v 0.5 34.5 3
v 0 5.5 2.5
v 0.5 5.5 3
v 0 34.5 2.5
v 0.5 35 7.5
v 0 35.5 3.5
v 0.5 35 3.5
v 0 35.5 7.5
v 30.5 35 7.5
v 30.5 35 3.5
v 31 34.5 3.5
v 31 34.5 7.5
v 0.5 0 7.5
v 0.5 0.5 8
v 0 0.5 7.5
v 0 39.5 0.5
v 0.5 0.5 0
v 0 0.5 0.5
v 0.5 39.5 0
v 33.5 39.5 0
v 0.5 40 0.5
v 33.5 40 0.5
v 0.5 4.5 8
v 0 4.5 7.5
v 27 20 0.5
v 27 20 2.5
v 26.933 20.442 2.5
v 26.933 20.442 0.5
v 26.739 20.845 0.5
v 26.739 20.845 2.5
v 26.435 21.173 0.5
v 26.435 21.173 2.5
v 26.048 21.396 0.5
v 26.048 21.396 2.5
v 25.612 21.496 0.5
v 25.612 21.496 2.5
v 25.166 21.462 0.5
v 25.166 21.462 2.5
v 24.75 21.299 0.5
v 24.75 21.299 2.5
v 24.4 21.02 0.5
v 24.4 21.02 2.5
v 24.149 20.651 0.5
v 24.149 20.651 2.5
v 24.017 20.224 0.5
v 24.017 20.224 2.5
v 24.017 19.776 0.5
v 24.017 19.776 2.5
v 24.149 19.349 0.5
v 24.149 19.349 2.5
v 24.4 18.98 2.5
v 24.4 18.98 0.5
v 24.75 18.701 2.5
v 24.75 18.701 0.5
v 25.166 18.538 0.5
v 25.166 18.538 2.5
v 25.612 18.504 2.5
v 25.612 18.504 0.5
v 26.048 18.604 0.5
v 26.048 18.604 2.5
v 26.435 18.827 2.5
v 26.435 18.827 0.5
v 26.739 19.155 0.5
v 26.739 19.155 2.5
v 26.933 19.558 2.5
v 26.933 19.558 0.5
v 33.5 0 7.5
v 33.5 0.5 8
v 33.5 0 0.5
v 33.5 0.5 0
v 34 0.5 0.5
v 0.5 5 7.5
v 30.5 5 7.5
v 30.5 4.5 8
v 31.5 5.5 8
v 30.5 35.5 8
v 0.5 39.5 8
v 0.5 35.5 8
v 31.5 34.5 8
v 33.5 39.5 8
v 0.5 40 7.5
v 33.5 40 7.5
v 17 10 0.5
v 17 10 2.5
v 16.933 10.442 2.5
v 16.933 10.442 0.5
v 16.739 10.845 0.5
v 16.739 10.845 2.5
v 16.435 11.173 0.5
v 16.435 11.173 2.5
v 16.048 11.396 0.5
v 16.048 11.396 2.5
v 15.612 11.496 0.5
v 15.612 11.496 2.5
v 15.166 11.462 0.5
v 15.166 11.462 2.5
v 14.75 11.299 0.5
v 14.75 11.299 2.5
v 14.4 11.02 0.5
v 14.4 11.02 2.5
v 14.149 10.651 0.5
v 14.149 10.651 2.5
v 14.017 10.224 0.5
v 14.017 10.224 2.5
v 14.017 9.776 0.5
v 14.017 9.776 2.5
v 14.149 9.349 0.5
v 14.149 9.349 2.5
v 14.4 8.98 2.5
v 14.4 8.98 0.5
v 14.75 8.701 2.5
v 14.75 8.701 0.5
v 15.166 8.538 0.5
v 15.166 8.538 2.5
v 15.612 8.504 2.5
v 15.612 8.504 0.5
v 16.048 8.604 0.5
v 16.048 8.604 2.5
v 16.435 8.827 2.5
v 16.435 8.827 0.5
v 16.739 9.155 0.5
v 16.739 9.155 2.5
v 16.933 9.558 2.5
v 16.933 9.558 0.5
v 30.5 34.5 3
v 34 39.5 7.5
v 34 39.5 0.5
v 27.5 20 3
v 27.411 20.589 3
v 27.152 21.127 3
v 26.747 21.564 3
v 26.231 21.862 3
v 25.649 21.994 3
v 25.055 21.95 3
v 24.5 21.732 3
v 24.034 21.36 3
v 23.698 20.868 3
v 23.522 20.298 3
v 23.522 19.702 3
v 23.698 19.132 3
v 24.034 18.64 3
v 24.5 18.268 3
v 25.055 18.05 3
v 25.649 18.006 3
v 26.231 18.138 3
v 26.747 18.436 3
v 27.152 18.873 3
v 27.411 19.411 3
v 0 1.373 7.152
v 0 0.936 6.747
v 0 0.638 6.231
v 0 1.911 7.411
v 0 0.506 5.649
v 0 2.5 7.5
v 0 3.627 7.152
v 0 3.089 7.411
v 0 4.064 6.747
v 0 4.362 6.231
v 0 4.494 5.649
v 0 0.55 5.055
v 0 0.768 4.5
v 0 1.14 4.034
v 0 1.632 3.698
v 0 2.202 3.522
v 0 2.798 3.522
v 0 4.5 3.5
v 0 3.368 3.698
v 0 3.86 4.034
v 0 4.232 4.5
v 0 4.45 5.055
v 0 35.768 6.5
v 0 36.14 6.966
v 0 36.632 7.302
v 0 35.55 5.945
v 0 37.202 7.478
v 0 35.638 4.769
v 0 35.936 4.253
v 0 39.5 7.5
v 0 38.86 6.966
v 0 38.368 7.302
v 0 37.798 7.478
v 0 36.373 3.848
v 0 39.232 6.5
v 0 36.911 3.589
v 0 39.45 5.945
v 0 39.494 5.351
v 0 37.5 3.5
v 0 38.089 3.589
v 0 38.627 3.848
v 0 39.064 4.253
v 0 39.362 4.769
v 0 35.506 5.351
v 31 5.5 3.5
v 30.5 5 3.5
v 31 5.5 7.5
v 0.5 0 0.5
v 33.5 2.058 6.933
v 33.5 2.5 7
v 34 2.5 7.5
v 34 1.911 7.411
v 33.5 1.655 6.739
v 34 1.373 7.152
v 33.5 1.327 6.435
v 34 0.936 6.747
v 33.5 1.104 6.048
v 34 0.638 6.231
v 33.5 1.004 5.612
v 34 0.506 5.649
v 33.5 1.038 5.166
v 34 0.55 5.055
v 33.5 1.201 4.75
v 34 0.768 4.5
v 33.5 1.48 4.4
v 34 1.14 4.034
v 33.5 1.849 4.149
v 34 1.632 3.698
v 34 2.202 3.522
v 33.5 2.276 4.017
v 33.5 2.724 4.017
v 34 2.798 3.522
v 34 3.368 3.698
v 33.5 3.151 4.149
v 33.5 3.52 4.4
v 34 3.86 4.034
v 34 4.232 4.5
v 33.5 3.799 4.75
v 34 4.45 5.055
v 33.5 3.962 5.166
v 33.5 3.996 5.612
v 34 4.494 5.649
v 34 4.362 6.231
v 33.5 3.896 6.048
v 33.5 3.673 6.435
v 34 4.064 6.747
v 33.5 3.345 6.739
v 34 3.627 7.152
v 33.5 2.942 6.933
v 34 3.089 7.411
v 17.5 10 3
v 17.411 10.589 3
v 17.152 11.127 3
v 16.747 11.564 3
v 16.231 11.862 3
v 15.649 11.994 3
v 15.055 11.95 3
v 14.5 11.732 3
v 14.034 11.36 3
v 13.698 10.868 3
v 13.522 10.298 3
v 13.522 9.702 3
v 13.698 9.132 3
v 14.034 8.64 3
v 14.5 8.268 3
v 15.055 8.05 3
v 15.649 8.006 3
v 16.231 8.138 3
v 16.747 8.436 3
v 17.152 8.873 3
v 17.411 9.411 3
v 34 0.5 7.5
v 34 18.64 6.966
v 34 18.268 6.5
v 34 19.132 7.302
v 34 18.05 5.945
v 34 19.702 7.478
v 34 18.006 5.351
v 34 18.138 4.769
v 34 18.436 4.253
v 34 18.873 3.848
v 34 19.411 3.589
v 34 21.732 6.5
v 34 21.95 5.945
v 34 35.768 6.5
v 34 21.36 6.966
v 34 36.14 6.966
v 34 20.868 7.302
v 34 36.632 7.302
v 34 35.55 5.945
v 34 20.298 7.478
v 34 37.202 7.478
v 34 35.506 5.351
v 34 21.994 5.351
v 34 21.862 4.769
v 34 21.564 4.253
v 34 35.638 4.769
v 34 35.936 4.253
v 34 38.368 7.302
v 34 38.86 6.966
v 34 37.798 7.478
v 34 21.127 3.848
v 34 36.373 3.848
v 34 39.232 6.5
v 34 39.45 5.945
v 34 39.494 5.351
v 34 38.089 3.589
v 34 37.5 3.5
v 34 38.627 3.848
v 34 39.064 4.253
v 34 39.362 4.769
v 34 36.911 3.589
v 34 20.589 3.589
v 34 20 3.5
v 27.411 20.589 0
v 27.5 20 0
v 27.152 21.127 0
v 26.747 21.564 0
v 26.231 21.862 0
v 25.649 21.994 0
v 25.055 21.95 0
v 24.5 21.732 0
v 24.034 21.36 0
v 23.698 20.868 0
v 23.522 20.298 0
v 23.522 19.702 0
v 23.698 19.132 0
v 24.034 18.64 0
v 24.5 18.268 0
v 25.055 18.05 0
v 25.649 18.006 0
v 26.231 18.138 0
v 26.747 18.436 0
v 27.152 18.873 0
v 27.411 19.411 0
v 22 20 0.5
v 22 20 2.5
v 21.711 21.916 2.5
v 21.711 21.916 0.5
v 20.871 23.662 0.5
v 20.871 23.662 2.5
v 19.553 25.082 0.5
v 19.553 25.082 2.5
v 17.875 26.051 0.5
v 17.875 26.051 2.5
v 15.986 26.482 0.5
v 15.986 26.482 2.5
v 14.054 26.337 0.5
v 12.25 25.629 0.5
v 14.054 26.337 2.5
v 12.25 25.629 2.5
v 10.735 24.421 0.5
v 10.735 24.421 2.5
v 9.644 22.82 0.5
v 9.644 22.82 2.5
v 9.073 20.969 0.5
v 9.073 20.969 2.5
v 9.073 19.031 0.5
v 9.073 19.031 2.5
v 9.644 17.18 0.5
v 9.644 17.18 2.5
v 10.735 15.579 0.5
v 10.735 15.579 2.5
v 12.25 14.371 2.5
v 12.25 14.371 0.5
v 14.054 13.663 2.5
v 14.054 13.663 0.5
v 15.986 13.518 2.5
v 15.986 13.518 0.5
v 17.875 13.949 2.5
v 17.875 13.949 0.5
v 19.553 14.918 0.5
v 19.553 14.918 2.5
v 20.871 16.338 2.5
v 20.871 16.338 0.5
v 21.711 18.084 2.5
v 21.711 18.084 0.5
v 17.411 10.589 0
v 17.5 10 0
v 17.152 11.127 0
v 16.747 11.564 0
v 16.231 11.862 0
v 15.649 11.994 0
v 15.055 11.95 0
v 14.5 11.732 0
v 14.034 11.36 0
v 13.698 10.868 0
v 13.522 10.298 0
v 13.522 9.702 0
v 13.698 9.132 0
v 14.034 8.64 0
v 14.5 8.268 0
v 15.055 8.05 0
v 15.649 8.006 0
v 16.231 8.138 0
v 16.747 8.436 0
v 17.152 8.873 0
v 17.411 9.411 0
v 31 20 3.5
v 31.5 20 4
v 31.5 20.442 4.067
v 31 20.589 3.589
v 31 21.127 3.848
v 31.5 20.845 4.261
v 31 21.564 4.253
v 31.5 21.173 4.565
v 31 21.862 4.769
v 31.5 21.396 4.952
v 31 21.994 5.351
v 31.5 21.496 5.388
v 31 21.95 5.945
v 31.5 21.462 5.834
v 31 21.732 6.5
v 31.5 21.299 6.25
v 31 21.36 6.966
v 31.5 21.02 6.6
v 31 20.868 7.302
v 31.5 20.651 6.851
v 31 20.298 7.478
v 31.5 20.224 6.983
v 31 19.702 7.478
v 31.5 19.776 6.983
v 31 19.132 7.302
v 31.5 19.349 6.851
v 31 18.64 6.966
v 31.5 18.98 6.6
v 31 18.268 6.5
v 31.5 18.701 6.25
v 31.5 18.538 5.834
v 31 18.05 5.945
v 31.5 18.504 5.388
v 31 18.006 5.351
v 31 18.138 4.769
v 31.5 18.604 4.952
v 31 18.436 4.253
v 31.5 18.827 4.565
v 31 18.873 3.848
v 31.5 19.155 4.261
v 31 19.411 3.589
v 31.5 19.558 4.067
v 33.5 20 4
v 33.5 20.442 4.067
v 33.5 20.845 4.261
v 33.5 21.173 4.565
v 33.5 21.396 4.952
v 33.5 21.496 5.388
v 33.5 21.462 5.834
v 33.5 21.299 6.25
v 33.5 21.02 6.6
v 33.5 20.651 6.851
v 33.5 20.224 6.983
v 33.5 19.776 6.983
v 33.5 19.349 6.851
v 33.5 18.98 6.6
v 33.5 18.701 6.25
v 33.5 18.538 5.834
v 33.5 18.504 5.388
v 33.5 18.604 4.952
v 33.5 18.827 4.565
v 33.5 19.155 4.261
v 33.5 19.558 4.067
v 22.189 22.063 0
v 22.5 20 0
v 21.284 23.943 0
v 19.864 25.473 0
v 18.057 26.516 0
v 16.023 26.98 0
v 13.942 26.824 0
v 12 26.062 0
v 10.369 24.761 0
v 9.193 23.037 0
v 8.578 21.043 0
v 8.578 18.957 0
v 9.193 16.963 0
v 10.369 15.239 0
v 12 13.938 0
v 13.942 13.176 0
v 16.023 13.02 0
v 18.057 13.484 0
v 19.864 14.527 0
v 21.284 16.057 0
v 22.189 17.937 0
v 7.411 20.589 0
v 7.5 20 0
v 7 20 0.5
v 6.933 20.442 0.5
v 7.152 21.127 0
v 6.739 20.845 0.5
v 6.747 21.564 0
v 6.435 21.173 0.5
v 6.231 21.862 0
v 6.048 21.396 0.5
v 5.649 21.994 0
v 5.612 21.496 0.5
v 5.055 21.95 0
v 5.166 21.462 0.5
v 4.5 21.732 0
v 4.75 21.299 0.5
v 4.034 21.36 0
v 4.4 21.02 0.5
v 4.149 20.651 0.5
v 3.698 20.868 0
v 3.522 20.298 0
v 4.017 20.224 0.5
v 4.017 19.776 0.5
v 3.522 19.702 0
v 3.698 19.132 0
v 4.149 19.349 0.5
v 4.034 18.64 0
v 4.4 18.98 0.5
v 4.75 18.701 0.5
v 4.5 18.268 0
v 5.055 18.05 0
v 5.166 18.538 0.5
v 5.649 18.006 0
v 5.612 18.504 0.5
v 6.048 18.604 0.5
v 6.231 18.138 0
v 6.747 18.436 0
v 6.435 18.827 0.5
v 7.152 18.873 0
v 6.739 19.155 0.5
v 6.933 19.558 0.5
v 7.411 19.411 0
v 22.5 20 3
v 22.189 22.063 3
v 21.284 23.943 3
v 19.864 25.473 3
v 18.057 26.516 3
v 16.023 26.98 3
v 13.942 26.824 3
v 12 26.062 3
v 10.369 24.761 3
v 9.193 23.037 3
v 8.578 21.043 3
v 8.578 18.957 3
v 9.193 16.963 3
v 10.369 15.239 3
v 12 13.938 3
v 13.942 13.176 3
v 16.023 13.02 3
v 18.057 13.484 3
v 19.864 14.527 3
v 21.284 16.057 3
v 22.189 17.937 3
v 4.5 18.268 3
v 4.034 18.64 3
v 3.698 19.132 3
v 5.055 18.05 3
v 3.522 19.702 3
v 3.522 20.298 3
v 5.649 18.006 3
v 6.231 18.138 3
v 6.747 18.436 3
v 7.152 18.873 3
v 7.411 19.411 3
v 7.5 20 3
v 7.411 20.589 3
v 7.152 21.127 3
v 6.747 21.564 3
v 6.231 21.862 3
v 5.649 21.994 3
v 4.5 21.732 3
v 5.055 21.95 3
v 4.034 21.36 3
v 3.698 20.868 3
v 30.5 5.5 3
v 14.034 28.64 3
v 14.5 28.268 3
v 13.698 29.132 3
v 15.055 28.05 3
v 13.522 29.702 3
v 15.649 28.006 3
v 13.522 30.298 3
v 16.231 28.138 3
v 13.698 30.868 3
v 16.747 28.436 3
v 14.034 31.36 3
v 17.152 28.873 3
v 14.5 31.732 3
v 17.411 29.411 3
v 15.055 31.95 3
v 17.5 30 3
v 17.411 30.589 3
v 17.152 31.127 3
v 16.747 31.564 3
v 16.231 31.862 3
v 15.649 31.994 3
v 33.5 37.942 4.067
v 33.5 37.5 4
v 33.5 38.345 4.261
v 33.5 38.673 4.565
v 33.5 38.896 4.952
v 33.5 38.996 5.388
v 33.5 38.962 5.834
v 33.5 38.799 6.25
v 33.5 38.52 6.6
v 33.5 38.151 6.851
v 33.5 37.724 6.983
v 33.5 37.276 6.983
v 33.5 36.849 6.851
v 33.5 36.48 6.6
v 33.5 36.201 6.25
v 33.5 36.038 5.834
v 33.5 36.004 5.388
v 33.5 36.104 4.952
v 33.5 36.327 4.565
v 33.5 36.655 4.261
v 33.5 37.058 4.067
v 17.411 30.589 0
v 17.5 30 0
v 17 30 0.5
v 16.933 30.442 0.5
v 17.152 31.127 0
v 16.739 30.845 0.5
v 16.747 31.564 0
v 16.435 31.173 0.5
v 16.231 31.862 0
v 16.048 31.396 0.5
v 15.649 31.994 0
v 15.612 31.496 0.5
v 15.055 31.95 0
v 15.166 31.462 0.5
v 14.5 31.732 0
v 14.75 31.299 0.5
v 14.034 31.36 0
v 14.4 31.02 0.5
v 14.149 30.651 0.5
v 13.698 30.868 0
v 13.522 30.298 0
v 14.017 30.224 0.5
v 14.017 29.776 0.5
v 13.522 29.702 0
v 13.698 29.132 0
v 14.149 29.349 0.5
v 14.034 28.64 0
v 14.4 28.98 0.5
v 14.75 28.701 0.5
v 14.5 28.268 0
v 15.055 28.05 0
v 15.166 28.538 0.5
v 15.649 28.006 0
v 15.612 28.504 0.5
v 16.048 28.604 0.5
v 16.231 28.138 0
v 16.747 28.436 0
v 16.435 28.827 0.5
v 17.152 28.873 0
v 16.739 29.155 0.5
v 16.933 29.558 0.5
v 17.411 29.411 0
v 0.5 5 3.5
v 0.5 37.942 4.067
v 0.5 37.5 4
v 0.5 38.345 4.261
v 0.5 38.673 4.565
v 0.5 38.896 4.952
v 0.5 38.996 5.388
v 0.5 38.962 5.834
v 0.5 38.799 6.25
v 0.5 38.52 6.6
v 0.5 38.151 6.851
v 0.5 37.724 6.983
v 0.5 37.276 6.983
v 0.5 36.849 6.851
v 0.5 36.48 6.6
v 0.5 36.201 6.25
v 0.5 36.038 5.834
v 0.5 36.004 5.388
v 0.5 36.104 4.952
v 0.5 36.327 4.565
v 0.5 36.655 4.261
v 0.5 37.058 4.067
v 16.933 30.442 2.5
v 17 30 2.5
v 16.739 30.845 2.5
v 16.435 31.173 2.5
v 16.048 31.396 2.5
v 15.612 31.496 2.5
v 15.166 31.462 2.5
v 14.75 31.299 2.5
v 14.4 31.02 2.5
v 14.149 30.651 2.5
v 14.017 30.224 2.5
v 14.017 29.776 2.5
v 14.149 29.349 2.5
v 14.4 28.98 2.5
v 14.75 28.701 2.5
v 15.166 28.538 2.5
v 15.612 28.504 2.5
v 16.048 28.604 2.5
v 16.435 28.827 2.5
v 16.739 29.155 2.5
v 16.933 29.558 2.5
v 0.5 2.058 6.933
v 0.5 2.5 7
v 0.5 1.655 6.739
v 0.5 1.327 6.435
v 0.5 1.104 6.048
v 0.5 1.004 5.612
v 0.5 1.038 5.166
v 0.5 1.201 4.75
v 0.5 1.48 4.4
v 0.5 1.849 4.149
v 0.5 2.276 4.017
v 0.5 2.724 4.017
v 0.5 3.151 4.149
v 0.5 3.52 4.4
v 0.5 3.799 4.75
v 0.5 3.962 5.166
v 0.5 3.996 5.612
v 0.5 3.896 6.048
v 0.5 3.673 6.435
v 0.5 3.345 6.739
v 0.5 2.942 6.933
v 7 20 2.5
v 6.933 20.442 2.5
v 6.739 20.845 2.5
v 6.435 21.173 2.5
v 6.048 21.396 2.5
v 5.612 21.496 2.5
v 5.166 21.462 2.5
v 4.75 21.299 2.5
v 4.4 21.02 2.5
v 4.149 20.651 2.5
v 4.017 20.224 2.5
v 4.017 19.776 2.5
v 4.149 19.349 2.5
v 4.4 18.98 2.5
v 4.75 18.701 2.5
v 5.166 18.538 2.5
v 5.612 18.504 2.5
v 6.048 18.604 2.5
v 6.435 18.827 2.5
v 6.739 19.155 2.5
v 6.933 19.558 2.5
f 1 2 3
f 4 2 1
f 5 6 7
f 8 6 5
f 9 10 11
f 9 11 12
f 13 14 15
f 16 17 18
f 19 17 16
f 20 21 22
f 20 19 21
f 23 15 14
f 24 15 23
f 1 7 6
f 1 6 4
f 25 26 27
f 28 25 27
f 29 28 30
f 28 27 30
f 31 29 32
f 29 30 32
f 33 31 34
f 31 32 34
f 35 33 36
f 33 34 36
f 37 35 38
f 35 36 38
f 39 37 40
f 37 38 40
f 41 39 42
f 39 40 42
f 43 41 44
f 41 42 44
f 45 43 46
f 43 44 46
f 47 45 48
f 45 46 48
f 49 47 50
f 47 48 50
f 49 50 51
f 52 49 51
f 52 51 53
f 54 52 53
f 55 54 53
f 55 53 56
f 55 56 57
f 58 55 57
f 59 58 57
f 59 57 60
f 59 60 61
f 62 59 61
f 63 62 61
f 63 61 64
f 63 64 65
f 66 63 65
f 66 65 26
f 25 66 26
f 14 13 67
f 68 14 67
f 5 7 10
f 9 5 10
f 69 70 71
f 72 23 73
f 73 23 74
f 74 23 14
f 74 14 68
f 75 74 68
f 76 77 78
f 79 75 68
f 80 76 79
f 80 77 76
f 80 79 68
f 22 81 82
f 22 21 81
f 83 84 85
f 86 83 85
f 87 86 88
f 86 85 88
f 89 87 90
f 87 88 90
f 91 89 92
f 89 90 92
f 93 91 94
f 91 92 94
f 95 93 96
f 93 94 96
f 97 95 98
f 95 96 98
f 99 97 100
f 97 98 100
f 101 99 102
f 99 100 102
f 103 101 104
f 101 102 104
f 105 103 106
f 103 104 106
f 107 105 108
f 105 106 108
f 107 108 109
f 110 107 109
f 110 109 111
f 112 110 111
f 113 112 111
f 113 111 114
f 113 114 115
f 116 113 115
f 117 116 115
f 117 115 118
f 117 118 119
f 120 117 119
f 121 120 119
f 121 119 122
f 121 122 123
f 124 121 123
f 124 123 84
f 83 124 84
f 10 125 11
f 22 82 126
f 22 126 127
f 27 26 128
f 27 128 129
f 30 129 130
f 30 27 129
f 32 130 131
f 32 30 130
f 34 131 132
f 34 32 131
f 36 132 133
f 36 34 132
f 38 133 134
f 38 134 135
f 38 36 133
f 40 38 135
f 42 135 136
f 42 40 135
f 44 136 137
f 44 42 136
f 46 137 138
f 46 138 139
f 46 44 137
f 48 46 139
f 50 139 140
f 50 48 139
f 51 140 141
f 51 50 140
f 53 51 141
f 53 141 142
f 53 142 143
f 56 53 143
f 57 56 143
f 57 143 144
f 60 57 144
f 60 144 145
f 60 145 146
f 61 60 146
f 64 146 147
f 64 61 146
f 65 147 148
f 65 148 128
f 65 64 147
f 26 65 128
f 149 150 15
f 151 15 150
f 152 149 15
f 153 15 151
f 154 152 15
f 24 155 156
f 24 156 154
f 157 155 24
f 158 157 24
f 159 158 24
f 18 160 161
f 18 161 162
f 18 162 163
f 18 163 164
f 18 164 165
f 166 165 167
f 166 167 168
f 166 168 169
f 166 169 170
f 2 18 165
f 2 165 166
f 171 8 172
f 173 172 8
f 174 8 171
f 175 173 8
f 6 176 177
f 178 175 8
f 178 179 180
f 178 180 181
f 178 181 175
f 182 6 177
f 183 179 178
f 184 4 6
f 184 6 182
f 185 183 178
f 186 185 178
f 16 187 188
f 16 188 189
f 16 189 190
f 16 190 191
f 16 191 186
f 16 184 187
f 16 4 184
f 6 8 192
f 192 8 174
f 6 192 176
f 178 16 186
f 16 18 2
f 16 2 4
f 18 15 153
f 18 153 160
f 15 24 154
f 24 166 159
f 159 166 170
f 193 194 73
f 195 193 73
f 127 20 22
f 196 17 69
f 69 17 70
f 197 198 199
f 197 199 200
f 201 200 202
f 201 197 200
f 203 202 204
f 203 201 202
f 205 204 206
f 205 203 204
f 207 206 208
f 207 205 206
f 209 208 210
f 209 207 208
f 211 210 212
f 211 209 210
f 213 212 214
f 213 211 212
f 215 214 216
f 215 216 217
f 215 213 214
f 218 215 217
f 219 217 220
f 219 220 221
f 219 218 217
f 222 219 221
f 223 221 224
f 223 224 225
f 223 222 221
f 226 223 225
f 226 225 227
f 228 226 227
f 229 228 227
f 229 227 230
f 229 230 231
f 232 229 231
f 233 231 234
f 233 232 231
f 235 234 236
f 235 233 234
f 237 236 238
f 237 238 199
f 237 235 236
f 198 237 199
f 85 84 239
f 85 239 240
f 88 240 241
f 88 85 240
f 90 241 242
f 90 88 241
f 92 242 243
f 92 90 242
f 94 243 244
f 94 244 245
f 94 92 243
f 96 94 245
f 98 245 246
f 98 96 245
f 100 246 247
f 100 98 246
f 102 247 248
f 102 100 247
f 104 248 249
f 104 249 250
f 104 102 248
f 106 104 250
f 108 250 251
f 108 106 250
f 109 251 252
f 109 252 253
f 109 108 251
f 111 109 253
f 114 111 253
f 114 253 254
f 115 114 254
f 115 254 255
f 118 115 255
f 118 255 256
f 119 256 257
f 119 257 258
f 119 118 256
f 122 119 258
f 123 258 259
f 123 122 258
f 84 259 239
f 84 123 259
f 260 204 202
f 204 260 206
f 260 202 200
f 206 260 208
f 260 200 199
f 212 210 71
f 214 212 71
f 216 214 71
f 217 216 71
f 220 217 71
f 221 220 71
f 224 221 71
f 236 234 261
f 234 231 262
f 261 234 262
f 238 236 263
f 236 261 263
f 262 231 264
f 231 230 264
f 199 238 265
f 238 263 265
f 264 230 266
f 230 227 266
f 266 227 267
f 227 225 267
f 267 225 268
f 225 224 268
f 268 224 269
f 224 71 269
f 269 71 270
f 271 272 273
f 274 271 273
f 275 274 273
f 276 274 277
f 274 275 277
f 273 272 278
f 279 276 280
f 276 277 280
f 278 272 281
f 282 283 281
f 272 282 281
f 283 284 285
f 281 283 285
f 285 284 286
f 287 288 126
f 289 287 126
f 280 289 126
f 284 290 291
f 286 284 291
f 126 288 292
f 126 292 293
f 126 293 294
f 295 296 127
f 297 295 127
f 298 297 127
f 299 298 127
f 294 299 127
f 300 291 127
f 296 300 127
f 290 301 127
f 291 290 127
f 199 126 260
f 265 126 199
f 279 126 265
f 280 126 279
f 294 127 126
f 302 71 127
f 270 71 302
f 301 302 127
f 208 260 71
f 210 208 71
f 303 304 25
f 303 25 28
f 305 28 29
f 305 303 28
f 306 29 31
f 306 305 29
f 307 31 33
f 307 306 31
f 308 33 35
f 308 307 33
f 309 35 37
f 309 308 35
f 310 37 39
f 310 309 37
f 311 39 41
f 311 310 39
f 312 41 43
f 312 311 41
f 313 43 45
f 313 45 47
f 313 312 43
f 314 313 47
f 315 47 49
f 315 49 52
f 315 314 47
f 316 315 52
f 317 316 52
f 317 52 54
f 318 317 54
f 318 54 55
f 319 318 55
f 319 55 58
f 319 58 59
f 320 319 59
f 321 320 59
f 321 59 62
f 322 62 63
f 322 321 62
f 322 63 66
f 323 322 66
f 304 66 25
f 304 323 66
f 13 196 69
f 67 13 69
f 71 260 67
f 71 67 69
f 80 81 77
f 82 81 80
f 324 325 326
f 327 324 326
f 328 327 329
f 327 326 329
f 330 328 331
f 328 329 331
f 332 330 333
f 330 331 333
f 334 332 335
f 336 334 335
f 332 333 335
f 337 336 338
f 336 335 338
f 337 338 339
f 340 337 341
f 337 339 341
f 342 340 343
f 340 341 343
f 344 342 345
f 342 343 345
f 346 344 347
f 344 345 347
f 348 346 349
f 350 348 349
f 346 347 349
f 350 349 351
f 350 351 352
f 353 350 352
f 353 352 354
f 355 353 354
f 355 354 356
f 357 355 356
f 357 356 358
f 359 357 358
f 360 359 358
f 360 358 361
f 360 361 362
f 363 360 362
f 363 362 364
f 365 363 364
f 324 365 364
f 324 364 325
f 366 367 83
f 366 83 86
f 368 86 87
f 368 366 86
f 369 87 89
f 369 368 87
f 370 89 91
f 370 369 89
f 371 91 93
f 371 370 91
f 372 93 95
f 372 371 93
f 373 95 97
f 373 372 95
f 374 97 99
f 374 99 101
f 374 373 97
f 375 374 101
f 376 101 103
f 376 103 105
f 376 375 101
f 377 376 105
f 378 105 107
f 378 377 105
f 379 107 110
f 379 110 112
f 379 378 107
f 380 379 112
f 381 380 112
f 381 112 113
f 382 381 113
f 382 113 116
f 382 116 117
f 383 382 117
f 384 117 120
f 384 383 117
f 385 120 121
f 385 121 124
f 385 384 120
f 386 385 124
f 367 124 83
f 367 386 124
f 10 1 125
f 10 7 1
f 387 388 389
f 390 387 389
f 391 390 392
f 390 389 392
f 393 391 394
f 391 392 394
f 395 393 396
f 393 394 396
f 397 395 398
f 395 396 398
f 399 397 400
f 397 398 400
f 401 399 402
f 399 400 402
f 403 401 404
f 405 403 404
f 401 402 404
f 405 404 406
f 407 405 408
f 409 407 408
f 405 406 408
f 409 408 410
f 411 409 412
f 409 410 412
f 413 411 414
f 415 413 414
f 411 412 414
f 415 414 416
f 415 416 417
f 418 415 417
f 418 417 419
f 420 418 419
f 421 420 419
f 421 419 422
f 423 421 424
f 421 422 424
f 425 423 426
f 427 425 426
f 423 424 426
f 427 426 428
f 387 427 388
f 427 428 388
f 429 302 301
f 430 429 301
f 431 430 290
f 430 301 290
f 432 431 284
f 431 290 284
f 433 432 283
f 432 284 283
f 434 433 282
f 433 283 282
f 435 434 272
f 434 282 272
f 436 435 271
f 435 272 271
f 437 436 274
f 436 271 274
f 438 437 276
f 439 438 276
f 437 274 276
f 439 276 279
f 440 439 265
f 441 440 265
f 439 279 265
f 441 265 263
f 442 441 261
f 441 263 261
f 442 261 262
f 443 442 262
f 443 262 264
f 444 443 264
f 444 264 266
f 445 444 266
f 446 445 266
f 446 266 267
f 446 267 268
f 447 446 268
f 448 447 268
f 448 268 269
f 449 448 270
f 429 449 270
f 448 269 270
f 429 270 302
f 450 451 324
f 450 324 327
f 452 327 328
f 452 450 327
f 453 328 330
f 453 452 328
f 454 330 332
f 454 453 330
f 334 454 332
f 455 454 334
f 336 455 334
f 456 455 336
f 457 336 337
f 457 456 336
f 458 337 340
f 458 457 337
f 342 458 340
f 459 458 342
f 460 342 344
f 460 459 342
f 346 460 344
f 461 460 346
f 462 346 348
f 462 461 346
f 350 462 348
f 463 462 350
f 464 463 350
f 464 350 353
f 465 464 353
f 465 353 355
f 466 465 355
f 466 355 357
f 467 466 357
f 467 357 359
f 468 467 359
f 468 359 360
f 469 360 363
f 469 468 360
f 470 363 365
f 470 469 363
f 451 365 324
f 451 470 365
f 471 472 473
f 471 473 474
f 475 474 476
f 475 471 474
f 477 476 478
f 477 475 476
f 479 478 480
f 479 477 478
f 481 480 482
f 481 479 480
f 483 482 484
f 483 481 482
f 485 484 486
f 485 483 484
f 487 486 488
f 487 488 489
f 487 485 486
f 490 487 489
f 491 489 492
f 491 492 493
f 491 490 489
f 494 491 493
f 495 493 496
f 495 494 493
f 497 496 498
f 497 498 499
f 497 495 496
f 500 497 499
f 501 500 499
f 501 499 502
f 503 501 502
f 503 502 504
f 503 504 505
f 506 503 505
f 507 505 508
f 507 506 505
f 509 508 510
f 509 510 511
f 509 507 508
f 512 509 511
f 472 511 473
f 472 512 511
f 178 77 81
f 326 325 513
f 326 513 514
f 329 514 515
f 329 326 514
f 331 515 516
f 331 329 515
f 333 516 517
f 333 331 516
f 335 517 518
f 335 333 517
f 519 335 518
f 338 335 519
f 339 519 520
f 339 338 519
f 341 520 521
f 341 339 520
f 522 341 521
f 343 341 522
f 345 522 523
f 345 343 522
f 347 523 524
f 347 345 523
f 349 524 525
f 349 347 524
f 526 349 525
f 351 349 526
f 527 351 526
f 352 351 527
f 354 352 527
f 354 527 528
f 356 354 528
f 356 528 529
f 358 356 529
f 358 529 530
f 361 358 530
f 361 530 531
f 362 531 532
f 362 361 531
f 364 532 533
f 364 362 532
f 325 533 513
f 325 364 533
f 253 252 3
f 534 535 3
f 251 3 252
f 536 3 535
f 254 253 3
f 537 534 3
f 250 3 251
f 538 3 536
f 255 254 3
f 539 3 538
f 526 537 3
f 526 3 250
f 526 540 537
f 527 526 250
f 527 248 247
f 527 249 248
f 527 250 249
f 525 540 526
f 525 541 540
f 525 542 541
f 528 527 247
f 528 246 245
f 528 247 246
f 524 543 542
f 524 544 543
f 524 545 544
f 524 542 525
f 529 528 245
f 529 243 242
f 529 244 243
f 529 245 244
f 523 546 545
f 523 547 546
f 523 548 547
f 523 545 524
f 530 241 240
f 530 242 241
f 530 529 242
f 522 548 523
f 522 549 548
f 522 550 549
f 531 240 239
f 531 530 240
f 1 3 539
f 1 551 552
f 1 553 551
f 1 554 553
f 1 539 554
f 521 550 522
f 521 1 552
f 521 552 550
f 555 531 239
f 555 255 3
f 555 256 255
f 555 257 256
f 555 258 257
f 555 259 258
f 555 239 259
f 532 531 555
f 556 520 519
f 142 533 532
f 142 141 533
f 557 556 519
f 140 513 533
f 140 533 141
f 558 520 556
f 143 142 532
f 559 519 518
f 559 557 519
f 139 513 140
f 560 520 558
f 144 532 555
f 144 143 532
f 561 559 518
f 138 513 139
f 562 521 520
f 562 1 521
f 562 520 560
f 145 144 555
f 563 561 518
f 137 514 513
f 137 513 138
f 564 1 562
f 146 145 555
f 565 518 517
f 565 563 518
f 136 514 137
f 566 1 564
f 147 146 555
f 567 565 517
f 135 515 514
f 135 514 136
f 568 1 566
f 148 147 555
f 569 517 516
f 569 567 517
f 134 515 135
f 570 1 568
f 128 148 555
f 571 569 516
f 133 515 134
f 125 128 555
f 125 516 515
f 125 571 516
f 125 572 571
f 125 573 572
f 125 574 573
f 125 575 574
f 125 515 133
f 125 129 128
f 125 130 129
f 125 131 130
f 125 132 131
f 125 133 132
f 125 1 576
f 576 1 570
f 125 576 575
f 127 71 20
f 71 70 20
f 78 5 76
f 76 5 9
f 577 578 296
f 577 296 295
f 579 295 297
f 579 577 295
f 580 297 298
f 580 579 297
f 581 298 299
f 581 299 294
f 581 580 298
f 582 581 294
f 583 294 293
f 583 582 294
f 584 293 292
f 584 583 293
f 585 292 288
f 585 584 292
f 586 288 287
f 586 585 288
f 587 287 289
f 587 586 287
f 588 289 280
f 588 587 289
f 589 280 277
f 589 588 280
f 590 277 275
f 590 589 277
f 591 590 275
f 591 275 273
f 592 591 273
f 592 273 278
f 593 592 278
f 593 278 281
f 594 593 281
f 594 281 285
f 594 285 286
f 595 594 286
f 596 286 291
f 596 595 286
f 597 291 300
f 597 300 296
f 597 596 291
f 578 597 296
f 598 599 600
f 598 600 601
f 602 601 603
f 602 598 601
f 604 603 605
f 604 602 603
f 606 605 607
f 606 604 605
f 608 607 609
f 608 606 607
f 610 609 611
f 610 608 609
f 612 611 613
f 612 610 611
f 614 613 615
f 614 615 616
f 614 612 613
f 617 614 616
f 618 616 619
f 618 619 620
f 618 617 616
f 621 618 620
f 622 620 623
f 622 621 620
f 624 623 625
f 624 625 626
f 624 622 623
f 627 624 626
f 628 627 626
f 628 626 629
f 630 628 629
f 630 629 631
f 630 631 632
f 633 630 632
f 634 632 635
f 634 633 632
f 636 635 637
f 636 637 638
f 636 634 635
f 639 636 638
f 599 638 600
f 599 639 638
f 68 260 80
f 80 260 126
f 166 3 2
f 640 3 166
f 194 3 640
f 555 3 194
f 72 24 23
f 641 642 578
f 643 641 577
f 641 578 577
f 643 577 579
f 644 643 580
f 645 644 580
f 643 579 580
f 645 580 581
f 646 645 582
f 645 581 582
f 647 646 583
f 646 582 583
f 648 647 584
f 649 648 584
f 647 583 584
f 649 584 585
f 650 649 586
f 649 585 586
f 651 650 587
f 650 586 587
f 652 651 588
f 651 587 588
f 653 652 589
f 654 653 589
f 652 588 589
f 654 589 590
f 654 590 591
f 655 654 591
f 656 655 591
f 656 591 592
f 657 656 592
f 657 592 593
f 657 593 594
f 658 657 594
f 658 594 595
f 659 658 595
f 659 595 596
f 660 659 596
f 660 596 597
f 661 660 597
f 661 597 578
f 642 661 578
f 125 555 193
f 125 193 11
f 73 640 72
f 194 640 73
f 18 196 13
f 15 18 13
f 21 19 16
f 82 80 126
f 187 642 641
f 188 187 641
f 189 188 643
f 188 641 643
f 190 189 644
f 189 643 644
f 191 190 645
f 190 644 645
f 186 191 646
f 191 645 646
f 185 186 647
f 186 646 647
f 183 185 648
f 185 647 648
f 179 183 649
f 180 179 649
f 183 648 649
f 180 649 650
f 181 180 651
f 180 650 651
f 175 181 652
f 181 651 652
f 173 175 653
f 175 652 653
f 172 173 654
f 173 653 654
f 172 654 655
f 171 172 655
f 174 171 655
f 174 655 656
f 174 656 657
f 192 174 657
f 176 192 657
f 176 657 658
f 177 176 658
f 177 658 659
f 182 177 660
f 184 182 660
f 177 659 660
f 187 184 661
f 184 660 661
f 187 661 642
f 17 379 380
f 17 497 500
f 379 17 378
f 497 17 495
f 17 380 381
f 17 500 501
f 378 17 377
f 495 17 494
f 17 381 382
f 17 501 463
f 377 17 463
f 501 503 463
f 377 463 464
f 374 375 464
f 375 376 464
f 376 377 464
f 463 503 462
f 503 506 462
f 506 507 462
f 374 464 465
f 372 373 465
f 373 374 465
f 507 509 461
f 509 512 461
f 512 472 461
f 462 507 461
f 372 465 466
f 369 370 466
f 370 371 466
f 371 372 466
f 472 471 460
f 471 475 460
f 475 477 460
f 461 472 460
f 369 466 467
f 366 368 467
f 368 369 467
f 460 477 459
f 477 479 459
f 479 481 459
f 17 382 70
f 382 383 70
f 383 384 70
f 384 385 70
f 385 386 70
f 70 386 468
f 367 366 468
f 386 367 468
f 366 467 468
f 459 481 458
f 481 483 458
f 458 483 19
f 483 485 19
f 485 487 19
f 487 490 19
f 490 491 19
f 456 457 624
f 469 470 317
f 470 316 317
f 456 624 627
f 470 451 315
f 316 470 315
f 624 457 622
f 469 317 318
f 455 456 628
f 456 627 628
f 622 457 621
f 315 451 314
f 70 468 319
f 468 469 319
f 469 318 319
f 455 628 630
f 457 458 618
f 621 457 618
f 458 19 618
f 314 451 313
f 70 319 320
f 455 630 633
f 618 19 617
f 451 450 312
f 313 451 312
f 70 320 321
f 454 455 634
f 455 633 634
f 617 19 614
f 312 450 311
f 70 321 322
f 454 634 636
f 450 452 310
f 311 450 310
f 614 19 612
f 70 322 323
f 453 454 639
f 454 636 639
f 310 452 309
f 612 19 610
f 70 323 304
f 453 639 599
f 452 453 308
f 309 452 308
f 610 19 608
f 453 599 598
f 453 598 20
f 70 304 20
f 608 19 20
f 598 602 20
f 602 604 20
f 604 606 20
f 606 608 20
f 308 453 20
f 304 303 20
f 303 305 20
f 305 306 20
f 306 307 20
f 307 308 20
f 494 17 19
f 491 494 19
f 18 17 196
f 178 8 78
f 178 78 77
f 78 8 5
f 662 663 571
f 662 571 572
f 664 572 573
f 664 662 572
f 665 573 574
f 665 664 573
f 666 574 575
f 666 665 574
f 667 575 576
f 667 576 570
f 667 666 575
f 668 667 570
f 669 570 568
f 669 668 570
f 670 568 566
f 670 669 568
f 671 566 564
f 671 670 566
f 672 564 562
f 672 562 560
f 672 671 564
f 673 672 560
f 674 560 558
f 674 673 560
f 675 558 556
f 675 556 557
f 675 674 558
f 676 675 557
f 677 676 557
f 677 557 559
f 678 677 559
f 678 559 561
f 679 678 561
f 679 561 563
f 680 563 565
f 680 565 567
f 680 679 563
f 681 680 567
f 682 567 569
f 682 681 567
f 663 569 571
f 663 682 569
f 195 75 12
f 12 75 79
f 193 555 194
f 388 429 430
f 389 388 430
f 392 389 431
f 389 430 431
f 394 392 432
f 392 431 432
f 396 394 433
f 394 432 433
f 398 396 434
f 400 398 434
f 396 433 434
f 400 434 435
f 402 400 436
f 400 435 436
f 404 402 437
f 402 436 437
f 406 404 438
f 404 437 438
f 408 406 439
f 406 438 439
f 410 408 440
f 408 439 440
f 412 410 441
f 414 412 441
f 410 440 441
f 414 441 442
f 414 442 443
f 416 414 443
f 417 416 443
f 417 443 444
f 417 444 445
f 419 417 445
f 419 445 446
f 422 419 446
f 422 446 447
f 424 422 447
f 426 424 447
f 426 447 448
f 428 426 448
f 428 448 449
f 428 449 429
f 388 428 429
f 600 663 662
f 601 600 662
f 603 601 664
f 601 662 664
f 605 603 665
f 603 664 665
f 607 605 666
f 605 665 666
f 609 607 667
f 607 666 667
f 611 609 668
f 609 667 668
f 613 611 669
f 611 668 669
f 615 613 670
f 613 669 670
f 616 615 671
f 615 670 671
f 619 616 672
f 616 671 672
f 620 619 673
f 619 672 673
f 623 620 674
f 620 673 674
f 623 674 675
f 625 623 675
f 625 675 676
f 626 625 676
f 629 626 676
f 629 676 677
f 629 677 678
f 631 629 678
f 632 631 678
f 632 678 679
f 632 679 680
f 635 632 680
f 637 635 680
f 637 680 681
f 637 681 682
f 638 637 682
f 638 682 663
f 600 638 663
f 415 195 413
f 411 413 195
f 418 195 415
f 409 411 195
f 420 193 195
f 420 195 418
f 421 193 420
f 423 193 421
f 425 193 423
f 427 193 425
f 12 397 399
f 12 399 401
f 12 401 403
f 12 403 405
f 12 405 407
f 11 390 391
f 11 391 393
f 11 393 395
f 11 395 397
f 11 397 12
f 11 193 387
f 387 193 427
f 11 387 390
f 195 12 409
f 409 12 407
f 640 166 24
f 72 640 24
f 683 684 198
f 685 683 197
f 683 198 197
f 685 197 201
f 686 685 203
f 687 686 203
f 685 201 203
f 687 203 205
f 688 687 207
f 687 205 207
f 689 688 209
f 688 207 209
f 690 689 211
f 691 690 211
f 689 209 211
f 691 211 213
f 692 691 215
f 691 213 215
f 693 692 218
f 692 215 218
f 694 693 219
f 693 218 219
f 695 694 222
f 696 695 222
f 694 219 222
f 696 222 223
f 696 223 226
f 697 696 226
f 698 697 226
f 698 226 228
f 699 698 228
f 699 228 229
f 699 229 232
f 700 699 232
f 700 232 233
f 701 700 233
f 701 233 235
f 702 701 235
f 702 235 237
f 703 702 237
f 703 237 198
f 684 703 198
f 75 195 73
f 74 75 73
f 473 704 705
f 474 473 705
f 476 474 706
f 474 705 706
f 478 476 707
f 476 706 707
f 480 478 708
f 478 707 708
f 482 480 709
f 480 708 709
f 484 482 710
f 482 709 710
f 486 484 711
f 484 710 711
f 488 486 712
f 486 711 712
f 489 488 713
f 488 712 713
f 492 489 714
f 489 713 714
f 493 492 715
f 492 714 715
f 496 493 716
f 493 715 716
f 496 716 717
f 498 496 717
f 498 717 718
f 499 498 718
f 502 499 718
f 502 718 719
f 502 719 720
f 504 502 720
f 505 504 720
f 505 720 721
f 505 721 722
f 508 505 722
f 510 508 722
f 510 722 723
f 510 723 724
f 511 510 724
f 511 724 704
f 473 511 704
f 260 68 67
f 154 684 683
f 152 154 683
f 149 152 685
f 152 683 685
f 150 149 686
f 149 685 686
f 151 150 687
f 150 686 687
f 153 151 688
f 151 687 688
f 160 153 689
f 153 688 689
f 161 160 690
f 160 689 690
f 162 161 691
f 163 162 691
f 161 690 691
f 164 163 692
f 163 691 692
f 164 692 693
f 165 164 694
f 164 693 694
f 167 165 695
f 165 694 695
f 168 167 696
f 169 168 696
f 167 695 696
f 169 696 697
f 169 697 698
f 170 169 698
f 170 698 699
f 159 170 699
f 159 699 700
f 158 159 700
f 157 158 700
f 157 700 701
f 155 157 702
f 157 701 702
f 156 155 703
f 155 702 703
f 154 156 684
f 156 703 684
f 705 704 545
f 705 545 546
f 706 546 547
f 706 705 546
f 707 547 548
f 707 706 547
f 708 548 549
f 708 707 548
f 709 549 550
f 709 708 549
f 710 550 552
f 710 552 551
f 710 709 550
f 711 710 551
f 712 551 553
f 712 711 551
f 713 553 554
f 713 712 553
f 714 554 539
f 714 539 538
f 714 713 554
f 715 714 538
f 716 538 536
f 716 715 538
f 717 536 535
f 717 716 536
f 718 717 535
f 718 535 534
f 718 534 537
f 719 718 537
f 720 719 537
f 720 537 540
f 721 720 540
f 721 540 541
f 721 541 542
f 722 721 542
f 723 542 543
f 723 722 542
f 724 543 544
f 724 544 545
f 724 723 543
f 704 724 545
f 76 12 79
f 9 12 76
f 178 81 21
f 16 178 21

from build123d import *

# Parameters (mm, degrees)
ESQUISSE1_W             = 34
ESQUISSE1_H             = 40
BOSS_EXTRU_1_DEPTH      = 3
ESQUISSE2_R             = 6.5
ENL_V_MAT_EXTRU_1_DEPTH = 4
ESQUISSE5_R             = 1.5
ENL_V_MAT_EXTRU_3_DEPTH = 5
ESQUISSE9_W             = 34
ESQUISSE9_H             = 5
BOSS_EXTRU_5_DEPTH      = 5
ESQUISSE10_R            = 1.5
ENL_V_MAT_EXTRU_6_DEPTH = 54.103672189
ESQUISSE11_W            = 3
ESQUISSE11_H            = 30
BOSS_EXTRU_6_DEPTH      = 5
ESQUISSE12_R            = 1.5
ENL_V_MAT_EXTRU_7_DEPTH = 5
CHANFREIN1_SIZE         = 0.5


with BuildPart() as part:
    # Esquisse1 → Boss.-Extru.1 (new body)
    with BuildSketch(Plane.XY):
        with Locations((17, 20)):
            Rectangle(ESQUISSE1_W, ESQUISSE1_H)
    extrude(amount=BOSS_EXTRU_1_DEPTH)

    # Esquisse2 → Enlèv. mat.-Extru.1 (cut)
    with BuildSketch(Plane.XY.offset(3)):
        with Locations((15.5, 20)):
            Circle(ESQUISSE2_R)
    extrude(amount=-ENL_V_MAT_EXTRU_1_DEPTH, mode=Mode.SUBTRACT)

    # Esquisse5 → Enlèv. mat.-Extru.3 (cut)
    with BuildSketch(Plane.XY.offset(3)):
        with Locations((15.5, 30)):
            Circle(ESQUISSE5_R)
        with Locations((5.5, 20)):
            Circle(ESQUISSE5_R)
        with Locations((15.5, 10)):
            Circle(ESQUISSE5_R)
        with Locations((25.5, 20)):
            Circle(ESQUISSE5_R)
    extrude(amount=-ENL_V_MAT_EXTRU_3_DEPTH, mode=Mode.SUBTRACT)

    # Esquisse9 → Boss.-Extru.5 (add)
    with BuildSketch(Plane.XY.offset(3)):
        with Locations((17, 37.5)):
            Rectangle(ESQUISSE9_W, ESQUISSE9_H)
        with Locations((17, 2.5)):
            Rectangle(ESQUISSE9_W, ESQUISSE9_H)
    extrude(amount=BOSS_EXTRU_5_DEPTH)

    # Esquisse10 → Enlèv. mat.-Extru.6 (cut, through all)
    with BuildSketch(Plane(origin=(34, 0, 0), x_dir=(0, 0, -1), z_dir=(1, 0, 0))):
        with Locations((-5.5, 37.5)):
            Circle(ESQUISSE10_R)
        with Locations(Location((-5.5, 2.5, 0), (0, 0, 180))):
            Circle(ESQUISSE10_R)
    extrude(amount=-ENL_V_MAT_EXTRU_6_DEPTH, mode=Mode.SUBTRACT)

    # Esquisse11 → Boss.-Extru.6 (add)
    with BuildSketch(Plane.XY.offset(3)):
        with Locations((32.5, 20)):
            Rectangle(ESQUISSE11_W, ESQUISSE11_H)
    extrude(amount=BOSS_EXTRU_6_DEPTH)

    # Esquisse12 → Enlèv. mat.-Extru.7 (cut)
    with BuildSketch(Plane(origin=(34, 0, 0), x_dir=(0, 0, -1), z_dir=(1, 0, 0))):
        with Locations((-5.5, 20)):
            Circle(ESQUISSE12_R)
    extrude(amount=-ENL_V_MAT_EXTRU_7_DEPTH, mode=Mode.SUBTRACT)

    # Chanfrein1
    chanfrein1_edges = [part.edges().sort_by_distance(p)[0] for p in [
        (9, 20, 0),
        (9, 20, 3),
        (14, 30, 0),
        (14, 30, 3),
        (4, 20, 0),
        (4, 20, 3),
        (14, 10, 0),
        (14, 10, 3),
        (24, 20, 0),
        (24, 20, 3),
        (0, 20, 3),
        (15.5, 35, 3),
        (0, 35, 5.5),
        (0, 37.5, 8),
        (15.5, 35, 8),
        (34, 20, 8),
        (17, 40, 8),
        (17, 40, 0),
        (34, 20, 0),
        (0, 5, 5.5),
        (17, 0, 0),
        (0, 2.5, 8),
        (17, 0, 8),
        (0, 20, 0),
        (0, 37.5, 7),
        (34, 37.5, 7),
        (0, 2.5, 4),
        (34, 2.5, 4),
        (0, 40, 4),
        (15.5, 5, 8),
        (15.5, 5, 3),
        (34, 40, 4),
        (34, 0, 4),
        (0, 0, 4),
        (31, 20, 3),
        (31, 35, 5.5),
        (31, 5, 5.5),
        (31, 20, 8),
        (31, 20, 7),
        (34, 20, 7),
    ]]
    chamfer(chanfrein1_edges, length=CHANFREIN1_SIZE - 0.0001)  # a hair under: the kernel refuses the full size


solid = part.part
